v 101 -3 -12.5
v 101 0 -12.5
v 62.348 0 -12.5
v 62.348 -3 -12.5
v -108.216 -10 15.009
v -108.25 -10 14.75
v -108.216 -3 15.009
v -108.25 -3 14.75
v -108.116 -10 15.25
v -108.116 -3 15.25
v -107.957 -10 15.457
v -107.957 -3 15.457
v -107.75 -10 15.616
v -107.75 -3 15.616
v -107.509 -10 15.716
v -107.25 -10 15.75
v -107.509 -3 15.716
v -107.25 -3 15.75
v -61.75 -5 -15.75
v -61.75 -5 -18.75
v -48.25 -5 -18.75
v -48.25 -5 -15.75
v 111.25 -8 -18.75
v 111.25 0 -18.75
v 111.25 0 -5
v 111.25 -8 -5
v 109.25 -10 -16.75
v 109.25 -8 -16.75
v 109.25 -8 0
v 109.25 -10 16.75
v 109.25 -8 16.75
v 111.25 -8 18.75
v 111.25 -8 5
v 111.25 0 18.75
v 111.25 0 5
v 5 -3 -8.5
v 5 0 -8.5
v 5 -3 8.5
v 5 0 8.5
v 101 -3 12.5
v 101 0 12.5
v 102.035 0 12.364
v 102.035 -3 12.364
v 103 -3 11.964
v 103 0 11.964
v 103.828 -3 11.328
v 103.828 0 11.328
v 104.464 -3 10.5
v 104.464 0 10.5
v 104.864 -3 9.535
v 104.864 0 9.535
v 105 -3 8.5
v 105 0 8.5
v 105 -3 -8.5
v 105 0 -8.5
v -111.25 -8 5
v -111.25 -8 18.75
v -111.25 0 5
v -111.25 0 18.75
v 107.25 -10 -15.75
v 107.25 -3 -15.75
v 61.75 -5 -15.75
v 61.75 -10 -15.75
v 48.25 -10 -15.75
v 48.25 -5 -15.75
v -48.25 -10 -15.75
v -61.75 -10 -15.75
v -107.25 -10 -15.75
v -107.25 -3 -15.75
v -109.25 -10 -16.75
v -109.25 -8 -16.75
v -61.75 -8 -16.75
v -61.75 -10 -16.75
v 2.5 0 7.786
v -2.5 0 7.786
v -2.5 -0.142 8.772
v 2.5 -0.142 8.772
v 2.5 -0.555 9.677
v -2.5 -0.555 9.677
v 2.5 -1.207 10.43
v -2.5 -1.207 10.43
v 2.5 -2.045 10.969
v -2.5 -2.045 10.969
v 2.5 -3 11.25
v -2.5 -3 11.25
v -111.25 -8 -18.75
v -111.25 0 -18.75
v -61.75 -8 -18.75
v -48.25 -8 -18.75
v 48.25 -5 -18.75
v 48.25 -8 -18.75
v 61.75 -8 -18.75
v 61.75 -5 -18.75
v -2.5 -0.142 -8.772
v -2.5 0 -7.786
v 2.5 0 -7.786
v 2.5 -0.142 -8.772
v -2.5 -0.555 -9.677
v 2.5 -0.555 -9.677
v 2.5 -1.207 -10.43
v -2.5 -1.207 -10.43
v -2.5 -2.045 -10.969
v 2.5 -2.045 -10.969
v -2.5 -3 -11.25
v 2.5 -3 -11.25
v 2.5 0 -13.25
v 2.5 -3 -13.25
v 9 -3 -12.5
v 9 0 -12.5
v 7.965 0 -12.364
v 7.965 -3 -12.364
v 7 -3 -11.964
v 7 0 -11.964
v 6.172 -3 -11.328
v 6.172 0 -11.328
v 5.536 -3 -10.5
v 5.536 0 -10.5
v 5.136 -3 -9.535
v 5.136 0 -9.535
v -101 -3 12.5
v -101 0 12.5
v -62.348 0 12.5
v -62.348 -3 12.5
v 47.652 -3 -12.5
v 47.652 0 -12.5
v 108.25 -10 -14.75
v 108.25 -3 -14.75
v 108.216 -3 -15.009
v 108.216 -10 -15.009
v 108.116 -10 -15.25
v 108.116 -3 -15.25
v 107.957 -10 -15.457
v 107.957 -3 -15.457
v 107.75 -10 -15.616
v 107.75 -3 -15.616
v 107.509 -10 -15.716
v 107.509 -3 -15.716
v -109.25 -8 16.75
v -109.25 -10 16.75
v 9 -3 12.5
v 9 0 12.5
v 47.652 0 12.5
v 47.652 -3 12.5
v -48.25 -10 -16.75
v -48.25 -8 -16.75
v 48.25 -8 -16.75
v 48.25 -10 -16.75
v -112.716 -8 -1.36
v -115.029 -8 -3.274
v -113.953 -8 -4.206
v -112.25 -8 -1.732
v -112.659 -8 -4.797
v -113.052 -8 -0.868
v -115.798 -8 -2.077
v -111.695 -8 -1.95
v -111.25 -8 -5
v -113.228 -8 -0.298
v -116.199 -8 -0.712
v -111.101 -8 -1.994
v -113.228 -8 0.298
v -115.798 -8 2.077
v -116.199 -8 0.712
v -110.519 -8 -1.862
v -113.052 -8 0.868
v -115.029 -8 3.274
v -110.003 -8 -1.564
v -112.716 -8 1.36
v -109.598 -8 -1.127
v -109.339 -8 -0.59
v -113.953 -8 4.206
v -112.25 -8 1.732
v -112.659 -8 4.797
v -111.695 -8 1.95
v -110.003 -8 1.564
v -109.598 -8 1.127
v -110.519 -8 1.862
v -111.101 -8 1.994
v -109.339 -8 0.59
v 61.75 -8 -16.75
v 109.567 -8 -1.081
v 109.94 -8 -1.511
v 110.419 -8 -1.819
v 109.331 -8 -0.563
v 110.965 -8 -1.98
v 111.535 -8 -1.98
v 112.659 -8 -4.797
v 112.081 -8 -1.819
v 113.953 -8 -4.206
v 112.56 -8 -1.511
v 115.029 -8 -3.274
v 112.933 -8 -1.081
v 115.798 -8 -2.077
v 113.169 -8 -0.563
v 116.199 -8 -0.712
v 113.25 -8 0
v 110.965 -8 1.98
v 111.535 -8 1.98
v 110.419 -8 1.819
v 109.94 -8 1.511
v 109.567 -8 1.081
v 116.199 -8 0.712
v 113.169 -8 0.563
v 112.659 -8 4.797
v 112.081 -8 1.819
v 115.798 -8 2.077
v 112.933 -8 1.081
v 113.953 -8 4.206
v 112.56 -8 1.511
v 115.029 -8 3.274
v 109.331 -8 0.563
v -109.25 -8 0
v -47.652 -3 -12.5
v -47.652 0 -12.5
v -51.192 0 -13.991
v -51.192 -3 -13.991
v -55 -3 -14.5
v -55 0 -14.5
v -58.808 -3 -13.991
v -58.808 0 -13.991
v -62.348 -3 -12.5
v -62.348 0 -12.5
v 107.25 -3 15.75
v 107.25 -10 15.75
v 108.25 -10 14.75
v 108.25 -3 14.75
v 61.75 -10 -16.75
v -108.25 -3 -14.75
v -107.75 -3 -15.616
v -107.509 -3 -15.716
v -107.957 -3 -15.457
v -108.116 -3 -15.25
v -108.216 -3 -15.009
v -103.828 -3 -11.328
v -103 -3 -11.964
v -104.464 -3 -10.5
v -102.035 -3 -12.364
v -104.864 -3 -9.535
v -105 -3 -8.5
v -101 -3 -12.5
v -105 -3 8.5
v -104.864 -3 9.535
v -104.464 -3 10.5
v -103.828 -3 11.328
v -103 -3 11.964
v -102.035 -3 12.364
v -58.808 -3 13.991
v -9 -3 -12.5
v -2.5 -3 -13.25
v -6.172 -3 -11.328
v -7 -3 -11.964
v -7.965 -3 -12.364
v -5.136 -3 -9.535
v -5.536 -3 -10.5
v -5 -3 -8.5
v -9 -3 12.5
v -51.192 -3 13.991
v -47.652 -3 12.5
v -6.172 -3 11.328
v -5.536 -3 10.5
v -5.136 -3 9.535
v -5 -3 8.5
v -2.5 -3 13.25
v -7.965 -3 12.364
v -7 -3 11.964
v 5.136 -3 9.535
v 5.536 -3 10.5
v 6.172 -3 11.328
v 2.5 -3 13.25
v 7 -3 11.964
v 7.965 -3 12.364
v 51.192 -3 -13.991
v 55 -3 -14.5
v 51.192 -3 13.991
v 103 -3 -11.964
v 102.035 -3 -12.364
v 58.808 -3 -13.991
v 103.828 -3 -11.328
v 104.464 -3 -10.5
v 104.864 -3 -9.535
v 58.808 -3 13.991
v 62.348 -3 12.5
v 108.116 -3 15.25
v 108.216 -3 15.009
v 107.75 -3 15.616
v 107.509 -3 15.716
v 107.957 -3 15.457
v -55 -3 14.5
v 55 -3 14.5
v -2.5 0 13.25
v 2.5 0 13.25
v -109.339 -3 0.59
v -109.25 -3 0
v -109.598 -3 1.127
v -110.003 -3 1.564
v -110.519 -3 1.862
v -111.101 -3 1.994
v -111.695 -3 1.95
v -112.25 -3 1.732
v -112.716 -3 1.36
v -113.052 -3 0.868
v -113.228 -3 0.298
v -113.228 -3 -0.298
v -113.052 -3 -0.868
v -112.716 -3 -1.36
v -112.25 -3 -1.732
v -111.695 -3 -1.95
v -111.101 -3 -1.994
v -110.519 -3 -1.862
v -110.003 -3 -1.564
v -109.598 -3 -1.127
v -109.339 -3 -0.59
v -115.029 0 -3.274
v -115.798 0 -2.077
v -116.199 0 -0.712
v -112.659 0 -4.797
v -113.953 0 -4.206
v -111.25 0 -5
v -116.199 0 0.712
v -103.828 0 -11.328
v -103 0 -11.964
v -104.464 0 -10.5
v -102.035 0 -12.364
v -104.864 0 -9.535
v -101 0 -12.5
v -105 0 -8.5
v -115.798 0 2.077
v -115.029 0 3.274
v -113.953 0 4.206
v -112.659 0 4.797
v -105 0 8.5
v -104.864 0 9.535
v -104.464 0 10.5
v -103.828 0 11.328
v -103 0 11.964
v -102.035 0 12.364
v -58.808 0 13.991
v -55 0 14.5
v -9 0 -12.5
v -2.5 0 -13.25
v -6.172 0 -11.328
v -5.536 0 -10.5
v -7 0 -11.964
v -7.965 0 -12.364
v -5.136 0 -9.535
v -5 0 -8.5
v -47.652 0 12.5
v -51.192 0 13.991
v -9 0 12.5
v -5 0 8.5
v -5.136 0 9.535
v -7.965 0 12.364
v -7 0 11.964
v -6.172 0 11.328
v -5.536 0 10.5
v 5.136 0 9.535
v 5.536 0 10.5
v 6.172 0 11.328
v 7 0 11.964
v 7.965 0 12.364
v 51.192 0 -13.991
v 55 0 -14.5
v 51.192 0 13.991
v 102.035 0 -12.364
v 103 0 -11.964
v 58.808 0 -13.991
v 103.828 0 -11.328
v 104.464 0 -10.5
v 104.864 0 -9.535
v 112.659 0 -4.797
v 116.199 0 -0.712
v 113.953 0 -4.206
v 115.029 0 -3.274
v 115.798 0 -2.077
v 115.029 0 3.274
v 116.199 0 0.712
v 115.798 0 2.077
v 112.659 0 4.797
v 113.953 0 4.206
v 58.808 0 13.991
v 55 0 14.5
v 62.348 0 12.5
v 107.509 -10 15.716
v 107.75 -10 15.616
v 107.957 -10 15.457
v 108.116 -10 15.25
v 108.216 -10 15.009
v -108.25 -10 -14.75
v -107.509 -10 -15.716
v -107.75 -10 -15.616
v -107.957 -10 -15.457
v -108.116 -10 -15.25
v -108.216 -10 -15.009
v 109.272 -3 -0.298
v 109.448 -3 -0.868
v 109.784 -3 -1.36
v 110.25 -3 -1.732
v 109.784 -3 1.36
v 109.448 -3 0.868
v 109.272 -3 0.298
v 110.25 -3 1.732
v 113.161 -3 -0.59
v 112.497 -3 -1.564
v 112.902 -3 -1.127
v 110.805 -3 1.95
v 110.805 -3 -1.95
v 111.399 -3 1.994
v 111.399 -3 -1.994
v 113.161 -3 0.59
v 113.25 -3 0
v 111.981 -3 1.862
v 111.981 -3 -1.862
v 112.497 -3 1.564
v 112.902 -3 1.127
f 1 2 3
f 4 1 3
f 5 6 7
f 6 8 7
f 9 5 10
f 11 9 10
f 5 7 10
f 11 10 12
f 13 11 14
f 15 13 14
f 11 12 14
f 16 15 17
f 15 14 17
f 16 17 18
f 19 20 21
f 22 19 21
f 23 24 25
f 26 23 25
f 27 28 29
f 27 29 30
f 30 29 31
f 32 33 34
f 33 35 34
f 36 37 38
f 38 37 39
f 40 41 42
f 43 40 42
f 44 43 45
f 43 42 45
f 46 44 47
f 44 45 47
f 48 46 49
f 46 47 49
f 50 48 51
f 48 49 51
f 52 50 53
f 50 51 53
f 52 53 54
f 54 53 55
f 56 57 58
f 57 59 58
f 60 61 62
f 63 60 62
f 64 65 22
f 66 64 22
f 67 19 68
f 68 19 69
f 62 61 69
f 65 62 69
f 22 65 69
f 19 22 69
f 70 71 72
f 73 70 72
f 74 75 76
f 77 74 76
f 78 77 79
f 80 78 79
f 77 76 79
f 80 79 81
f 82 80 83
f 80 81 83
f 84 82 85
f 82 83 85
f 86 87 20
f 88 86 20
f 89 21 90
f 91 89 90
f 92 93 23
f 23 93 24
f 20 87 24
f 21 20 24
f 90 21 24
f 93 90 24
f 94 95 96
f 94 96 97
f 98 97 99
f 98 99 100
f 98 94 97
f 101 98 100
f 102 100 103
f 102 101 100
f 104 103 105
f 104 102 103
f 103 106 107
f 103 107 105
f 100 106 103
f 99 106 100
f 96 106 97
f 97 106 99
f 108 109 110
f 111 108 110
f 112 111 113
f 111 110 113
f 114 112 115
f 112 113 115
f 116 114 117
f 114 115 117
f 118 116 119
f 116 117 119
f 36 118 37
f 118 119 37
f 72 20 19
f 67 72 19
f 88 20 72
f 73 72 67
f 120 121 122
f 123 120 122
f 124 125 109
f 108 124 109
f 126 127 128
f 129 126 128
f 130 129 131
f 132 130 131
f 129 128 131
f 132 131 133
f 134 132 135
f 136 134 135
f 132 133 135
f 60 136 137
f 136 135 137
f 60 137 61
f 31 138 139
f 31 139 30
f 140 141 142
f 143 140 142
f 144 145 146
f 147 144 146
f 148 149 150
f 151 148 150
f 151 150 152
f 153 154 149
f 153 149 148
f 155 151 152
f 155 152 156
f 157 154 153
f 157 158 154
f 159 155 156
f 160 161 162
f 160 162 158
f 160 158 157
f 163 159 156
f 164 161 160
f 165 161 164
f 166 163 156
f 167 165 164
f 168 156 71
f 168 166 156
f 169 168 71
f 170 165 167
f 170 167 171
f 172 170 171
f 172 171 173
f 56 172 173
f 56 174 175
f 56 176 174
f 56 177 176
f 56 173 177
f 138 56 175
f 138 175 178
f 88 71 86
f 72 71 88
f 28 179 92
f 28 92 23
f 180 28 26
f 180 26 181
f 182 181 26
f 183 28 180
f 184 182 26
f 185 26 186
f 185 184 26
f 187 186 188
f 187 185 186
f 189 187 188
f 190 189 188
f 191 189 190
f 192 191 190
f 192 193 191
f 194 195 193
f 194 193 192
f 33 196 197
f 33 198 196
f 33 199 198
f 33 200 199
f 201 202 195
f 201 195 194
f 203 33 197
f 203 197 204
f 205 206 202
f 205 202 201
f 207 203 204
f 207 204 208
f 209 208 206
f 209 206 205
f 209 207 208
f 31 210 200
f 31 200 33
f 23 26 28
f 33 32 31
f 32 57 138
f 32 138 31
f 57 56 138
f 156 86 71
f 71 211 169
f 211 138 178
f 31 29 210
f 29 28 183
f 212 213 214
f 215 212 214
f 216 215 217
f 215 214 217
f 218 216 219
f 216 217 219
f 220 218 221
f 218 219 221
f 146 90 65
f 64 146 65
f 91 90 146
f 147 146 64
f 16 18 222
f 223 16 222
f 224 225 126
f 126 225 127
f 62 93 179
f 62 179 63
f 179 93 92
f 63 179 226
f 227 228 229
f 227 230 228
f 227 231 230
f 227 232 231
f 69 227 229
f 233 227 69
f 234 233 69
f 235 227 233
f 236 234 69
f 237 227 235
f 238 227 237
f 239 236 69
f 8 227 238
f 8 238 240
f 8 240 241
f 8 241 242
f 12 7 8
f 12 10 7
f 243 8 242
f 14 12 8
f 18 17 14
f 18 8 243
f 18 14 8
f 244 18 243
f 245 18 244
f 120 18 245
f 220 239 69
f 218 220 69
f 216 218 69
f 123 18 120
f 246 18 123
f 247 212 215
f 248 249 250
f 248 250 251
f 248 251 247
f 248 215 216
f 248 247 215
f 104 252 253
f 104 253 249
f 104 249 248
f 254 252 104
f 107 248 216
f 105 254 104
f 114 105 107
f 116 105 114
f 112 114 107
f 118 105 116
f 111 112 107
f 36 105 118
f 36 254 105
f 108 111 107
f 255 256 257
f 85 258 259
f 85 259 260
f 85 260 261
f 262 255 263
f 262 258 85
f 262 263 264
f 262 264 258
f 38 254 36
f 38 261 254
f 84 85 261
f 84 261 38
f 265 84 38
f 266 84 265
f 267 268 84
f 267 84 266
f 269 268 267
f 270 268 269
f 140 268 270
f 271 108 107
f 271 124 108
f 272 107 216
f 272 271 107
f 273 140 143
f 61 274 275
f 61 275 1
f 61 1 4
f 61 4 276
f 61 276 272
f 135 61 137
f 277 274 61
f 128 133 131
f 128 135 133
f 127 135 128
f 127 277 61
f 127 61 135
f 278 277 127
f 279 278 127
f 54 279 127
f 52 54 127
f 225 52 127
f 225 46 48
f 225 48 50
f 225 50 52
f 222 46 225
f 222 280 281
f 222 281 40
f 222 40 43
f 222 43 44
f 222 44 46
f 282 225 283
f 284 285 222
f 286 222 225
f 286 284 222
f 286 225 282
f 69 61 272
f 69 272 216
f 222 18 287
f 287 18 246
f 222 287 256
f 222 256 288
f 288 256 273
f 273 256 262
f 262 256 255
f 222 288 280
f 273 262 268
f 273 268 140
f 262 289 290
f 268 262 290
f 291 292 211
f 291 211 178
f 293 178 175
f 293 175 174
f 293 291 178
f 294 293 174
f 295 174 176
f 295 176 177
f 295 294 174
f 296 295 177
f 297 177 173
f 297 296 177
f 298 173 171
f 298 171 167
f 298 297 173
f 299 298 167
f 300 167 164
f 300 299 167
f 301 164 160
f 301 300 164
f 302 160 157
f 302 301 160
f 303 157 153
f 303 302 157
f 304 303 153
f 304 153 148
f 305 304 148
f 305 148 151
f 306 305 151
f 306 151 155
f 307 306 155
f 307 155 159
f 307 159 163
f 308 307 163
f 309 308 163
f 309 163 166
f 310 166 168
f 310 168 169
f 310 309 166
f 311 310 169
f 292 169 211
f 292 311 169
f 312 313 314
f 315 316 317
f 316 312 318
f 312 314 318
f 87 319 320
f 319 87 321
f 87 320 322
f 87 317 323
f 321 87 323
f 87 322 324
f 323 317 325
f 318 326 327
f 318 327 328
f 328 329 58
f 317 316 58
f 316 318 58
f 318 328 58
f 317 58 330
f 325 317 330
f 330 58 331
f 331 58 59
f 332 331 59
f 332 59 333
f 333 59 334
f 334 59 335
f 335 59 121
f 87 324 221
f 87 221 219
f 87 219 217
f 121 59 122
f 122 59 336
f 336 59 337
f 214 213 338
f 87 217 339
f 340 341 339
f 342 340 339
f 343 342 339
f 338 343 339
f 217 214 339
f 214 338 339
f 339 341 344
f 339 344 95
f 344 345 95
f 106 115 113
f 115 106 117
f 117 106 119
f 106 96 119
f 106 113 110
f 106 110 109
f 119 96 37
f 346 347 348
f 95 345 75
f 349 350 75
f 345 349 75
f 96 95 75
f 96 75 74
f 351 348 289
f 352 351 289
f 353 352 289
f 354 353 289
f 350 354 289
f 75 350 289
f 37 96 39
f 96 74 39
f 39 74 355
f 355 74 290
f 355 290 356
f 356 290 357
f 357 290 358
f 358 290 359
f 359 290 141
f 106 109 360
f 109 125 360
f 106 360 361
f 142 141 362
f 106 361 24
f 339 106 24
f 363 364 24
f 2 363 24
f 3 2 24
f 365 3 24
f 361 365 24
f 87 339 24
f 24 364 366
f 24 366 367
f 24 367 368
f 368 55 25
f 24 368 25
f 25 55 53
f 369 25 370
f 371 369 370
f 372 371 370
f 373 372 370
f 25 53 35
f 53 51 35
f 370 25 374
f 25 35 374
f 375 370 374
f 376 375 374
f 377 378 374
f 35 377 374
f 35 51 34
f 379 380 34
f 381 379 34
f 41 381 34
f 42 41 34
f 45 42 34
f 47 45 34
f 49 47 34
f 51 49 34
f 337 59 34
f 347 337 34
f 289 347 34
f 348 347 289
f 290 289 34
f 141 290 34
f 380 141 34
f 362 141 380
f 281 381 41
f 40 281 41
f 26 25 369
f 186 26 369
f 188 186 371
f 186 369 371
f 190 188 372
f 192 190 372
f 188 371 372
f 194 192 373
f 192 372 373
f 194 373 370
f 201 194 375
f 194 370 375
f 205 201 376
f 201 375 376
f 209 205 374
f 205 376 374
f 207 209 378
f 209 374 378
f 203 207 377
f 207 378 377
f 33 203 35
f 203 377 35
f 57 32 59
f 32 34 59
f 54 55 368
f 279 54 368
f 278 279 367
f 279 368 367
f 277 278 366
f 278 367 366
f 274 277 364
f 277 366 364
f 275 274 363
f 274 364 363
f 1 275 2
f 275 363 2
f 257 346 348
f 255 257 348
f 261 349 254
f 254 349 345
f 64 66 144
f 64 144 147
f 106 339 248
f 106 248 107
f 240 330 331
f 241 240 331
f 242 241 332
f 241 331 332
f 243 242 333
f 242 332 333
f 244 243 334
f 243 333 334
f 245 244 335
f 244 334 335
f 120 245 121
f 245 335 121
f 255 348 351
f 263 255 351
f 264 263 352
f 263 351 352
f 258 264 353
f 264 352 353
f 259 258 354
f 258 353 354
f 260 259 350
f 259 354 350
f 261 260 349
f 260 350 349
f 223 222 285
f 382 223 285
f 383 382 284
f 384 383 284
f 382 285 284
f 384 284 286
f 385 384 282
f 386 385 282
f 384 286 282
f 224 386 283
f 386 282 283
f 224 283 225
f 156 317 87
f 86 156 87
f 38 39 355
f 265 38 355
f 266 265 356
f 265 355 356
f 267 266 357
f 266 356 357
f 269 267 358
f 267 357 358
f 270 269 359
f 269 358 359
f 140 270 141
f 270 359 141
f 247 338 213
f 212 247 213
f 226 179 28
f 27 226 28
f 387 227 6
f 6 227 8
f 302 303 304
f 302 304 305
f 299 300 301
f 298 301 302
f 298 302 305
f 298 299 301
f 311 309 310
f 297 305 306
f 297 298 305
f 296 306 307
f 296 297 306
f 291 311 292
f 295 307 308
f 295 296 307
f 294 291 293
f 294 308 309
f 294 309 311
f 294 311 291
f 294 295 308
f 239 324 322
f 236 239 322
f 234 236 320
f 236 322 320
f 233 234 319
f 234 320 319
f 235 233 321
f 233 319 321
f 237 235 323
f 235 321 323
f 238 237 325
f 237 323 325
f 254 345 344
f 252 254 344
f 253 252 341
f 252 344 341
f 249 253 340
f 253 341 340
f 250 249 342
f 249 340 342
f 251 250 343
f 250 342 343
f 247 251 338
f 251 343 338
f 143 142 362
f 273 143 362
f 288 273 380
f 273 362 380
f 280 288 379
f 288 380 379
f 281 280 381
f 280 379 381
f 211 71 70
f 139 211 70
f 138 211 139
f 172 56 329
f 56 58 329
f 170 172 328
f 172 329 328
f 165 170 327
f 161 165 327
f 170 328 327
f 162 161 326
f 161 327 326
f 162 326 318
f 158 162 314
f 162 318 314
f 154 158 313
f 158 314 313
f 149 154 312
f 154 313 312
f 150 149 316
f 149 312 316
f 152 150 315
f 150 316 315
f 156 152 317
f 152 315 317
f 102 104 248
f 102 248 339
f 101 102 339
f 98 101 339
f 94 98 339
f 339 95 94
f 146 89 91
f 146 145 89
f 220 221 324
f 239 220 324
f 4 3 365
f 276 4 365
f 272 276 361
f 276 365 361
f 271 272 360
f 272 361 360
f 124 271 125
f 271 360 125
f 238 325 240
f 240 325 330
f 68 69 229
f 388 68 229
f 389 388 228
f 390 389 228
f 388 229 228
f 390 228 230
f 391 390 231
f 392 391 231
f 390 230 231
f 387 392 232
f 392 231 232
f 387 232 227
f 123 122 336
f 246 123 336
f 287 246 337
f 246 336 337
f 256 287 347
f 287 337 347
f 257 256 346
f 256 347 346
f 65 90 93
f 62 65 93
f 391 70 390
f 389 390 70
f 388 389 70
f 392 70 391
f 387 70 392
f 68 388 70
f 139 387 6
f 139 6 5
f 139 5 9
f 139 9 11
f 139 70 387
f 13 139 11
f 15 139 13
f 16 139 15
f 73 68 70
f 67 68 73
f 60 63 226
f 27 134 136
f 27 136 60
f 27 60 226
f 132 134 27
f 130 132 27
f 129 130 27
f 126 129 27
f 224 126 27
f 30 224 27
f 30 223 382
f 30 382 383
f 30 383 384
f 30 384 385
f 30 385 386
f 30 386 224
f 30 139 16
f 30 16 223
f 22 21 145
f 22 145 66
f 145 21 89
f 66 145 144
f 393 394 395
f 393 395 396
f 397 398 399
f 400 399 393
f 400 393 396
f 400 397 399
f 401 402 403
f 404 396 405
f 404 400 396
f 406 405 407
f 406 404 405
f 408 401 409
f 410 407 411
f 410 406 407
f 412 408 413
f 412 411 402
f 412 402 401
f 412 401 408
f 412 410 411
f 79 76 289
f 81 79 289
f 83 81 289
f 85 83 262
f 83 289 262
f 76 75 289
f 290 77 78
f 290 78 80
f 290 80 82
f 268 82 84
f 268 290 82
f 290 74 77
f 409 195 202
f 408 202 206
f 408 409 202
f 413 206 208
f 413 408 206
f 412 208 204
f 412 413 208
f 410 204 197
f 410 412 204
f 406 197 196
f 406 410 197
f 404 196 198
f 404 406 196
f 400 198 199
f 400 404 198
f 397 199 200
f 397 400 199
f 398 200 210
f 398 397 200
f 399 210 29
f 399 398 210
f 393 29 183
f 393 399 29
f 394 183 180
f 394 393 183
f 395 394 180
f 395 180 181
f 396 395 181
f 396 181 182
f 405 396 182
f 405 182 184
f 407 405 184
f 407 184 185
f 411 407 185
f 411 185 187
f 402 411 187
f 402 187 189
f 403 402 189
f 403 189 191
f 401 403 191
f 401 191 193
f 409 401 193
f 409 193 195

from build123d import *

# Parameters (mm, degrees)
F0_W        = 5
F0_H        = 2
F1_DEPTH    = 3
F2_R        = 2
F3_DEPTH    = 5
F4_W        = 218.5
F4_H        = 33.5
F5_DEPTH    = 2
F6_W        = 13.5
F6_H        = 5
F7_DEPTH    = 25
F8_T1_DEPTH = 5


# Not quite as in the source:
# - a fillet or chamfer that OpenCascade refuses, or shapes differently, is made with other operations: its cross-section is extruded or revolved along the edge and cut away or added
# - a feature names something its author has since deleted; it is built from what else it names


with BuildPart() as f1:
    # F0 (on Front) → F1 (new body)
    with BuildSketch(Plane.XZ):
        Polygon((111.25, 5), (111.25, 18.75), (-111.25, 18.75), (-111.25, 5), (-111.25, -5), (-111.25, -18.75), (111.25, -18.75), (111.25, -5), align=None)
        with Locations((0, -12.25)):
            Rectangle(F0_W, F0_H, mode=Mode.SUBTRACT)
        with BuildLine():
            Line((-47.6515307717, 12.5), (-9, 12.5))
            ThreePointArc((-9, 12.5), (-6.1715728753, 11.3284271247), (-5, 8.5))
            Line((-5, 8.5), (-5, -8.5))
            ThreePointArc((-5, -8.5), (-6.1715728753, -11.3284271247), (-9, -12.5))
            Line((-9, -12.5), (-47.6515307717, -12.5))
            ThreePointArc((-47.6515307717, -12.5), (-55, -14.5), (-62.3484692283, -12.5))
            Line((-62.3484692284, -12.5), (-101, -12.5))
            ThreePointArc((-101, -12.5), (-103.8284271247, -11.3284271247), (-105, -8.5))
            Line((-105, -8.5), (-105, 8.5))
            ThreePointArc((-105, 8.5), (-103.8284271247, 11.3284271247), (-101, 12.5))
            Line((-101, 12.5), (-62.3484692284, 12.5))
            ThreePointArc((-62.3484692283, 12.5), (-55, 14.5), (-47.6515307717, 12.5))
        make_face(mode=Mode.SUBTRACT)
        with BuildLine():
            Line((62.3484692283, 12.5), (101, 12.5))
            ThreePointArc((101, 12.5), (103.8284271247, 11.3284271247), (105, 8.5))
            Line((105, 8.5), (105, -8.5))
            ThreePointArc((105, -8.5), (103.8284271247, -11.3284271247), (101, -12.5))
            Line((101, -12.5), (62.3484692283, -12.5))
            ThreePointArc((62.3484692283, -12.5), (55, -14.5), (47.6515307717, -12.5))
            Line((47.6515307716, -12.5), (9, -12.5))
            ThreePointArc((9, -12.5), (6.1715728753, -11.3284271247), (5, -8.5))
            Line((5, -8.5), (5, 8.5))
            ThreePointArc((5, 8.5), (6.1715728753, 11.3284271247), (9, 12.5))
            Line((9, 12.5), (47.6515307716, 12.5))
            ThreePointArc((47.6515307717, 12.5), (55, 14.5), (62.3484692283, 12.5))
        make_face(mode=Mode.SUBTRACT)
        with Locations((0, 12.25)):
            Rectangle(F0_W, F0_H, mode=Mode.SUBTRACT)
        with BuildLine():
            ThreePointArc((111.25, -5), (116.25, 0), (111.25, 5))
            Line((111.25, 5), (111.25, -5))
        make_face()
        with BuildLine():
            Line((-111.25, -5), (-111.25, 5))
            ThreePointArc((-111.25, 5), (-116.25, 0), (-111.25, -5))
        make_face()
    extrude(amount=F1_DEPTH)

    # F2 (on face) → F3 (join)
    with BuildSketch(Plane.XZ.offset(3)):
        with BuildLine():
            ThreePointArc((111.25, -5), (116.25, 0), (111.25, 5))
            Line((111.25, 5), (111.25, 18.75))
            Line((111.25, 18.75), (-111.25, 18.75))
            Line((-111.25, 18.75), (-111.25, 5))
            ThreePointArc((-111.25, 5), (-116.25, 0), (-111.25, -5))
            Line((-111.25, -5), (-111.25, -18.75))
            Line((-111.25, -18.75), (111.25, -18.75))
            Line((111.25, -18.75), (111.25, -5))
        make_face()
        with Locations((-111.25, 0)):
            Circle(F2_R, mode=Mode.SUBTRACT)
        with BuildLine():
            Line((-107.25, 15.75), (107.25, 15.75))
            ThreePointArc((107.25, 15.75), (107.9571067812, 15.4571067812), (108.25, 14.75))
            Line((108.25, 14.75), (108.25, -14.75))
            ThreePointArc((108.25, -14.75), (107.9571067812, -15.4571067812), (107.25, -15.75))
            Line((107.25, -15.75), (-107.25, -15.75))
            ThreePointArc((-107.25, -15.75), (-107.9571067812, -15.4571067812), (-108.25, -14.75))
            Line((-108.25, -14.75), (-108.25, 14.75))
            ThreePointArc((-108.25, 14.75), (-107.9571067812, 15.4571067812), (-107.25, 15.75))
        make_face(mode=Mode.SUBTRACT)
        with Locations((111.25, 0)):
            Circle(F2_R, mode=Mode.SUBTRACT)
    extrude(amount=F3_DEPTH)

    # F4 (on face) → F5 (join)
    with BuildSketch(Plane.XZ.offset(8)):
        Rectangle(F4_W, F4_H)
        with BuildLine():
            ThreePointArc((-108.25, 14.75), (-107.9571067812, 15.4571067812), (-107.25, 15.75))
            Line((-107.25, 15.75), (107.25, 15.75))
            ThreePointArc((107.25, 15.75), (107.9571067812, 15.4571067812), (108.25, 14.75))
            Line((108.25, 14.75), (108.25, -14.75))
            ThreePointArc((108.25, -14.75), (107.9571067812, -15.4571067812), (107.25, -15.75))
            Line((107.25, -15.75), (-107.25, -15.75))
            ThreePointArc((-107.25, -15.75), (-107.9571067812, -15.4571067812), (-108.25, -14.75))
            Line((-108.25, -14.75), (-108.25, 14.75))
        make_face(mode=Mode.SUBTRACT)
    extrude(amount=F5_DEPTH)

    # F6 (on face) → F7 (cut)
    with BuildSketch(Plane(origin=(0, 0, -18.75), x_dir=(1, 0, 0), z_dir=(0, 0, -1))):
        with Locations((-55, 7.5)):
            Rectangle(F6_W, F6_H)
        with Locations((55, 7.5)):
            Rectangle(F6_W, F6_H)
    extrude(amount=-F7_DEPTH, mode=Mode.SUBTRACT)

    # F8: fillet of radius 3.5 on 2 edges, made by hand

    # F8_s2 → F8_t1 (cut)
    with BuildSketch(Plane.YZ.offset(-2.5)):
        with BuildLine():
            ThreePointArc((0, 7.7858983849), (-0.8542486889, 10.0771862323), (-3, 11.25))
            Line((-3, 11.25), (0, 11.25))
            Line((0, 11.25), (0, 7.7858983849))
        make_face()
        with BuildLine():
            ThreePointArc((0, -7.7858983849), (-0.8542486889, -10.0771862323), (-3, -11.25))
            Line((-3, -11.25), (0, -11.25))
            Line((0, -11.25), (0, -7.7858983849))
        make_face()
    extrude(amount=F8_T1_DEPTH, mode=Mode.SUBTRACT)


solid = f1.part
